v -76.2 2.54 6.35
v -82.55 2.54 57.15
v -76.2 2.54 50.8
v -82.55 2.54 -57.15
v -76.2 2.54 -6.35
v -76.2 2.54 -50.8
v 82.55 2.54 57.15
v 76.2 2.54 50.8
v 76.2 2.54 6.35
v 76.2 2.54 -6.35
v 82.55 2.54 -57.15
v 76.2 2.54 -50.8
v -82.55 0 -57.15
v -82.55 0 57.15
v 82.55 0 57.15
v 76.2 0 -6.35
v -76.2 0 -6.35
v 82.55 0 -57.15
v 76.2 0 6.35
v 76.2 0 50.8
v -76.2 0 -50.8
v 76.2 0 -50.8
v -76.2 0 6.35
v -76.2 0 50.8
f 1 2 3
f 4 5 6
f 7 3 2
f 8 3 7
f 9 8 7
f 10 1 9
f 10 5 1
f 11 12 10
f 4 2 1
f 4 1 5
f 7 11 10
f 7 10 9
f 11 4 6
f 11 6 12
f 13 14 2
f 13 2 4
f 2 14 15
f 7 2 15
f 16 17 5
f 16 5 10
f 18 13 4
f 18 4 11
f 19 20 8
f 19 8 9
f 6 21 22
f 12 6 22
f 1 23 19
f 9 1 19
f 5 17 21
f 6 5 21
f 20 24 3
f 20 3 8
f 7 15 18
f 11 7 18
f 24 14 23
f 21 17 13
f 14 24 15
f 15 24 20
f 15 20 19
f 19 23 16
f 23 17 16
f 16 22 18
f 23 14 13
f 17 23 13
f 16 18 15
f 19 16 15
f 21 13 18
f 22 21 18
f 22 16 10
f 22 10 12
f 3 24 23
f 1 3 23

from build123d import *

# Parameters (mm, degrees)
SKETCH1_W           = 165.1
SKETCH1_H           = 114.3
SKETCH1_W_2         = 152.4
SKETCH1_H_2         = 101.6
SKETCH1_H_3         = 12.7
BOSS_EXTRUDE1_DEPTH = 2.54


with BuildPart() as part:
    # Sketch1 → Boss-Extrude1 (new body)
    with BuildSketch(Plane(origin=(0, 0, 0), x_dir=(1, 0, 0), z_dir=(0, 1, 0))):
        Rectangle(SKETCH1_W, SKETCH1_H)
        Rectangle(SKETCH1_W_2, SKETCH1_H_2, mode=Mode.SUBTRACT)
        Rectangle(SKETCH1_W_2, SKETCH1_H_3)
    extrude(amount=BOSS_EXTRUDE1_DEPTH)


solid = part.part
